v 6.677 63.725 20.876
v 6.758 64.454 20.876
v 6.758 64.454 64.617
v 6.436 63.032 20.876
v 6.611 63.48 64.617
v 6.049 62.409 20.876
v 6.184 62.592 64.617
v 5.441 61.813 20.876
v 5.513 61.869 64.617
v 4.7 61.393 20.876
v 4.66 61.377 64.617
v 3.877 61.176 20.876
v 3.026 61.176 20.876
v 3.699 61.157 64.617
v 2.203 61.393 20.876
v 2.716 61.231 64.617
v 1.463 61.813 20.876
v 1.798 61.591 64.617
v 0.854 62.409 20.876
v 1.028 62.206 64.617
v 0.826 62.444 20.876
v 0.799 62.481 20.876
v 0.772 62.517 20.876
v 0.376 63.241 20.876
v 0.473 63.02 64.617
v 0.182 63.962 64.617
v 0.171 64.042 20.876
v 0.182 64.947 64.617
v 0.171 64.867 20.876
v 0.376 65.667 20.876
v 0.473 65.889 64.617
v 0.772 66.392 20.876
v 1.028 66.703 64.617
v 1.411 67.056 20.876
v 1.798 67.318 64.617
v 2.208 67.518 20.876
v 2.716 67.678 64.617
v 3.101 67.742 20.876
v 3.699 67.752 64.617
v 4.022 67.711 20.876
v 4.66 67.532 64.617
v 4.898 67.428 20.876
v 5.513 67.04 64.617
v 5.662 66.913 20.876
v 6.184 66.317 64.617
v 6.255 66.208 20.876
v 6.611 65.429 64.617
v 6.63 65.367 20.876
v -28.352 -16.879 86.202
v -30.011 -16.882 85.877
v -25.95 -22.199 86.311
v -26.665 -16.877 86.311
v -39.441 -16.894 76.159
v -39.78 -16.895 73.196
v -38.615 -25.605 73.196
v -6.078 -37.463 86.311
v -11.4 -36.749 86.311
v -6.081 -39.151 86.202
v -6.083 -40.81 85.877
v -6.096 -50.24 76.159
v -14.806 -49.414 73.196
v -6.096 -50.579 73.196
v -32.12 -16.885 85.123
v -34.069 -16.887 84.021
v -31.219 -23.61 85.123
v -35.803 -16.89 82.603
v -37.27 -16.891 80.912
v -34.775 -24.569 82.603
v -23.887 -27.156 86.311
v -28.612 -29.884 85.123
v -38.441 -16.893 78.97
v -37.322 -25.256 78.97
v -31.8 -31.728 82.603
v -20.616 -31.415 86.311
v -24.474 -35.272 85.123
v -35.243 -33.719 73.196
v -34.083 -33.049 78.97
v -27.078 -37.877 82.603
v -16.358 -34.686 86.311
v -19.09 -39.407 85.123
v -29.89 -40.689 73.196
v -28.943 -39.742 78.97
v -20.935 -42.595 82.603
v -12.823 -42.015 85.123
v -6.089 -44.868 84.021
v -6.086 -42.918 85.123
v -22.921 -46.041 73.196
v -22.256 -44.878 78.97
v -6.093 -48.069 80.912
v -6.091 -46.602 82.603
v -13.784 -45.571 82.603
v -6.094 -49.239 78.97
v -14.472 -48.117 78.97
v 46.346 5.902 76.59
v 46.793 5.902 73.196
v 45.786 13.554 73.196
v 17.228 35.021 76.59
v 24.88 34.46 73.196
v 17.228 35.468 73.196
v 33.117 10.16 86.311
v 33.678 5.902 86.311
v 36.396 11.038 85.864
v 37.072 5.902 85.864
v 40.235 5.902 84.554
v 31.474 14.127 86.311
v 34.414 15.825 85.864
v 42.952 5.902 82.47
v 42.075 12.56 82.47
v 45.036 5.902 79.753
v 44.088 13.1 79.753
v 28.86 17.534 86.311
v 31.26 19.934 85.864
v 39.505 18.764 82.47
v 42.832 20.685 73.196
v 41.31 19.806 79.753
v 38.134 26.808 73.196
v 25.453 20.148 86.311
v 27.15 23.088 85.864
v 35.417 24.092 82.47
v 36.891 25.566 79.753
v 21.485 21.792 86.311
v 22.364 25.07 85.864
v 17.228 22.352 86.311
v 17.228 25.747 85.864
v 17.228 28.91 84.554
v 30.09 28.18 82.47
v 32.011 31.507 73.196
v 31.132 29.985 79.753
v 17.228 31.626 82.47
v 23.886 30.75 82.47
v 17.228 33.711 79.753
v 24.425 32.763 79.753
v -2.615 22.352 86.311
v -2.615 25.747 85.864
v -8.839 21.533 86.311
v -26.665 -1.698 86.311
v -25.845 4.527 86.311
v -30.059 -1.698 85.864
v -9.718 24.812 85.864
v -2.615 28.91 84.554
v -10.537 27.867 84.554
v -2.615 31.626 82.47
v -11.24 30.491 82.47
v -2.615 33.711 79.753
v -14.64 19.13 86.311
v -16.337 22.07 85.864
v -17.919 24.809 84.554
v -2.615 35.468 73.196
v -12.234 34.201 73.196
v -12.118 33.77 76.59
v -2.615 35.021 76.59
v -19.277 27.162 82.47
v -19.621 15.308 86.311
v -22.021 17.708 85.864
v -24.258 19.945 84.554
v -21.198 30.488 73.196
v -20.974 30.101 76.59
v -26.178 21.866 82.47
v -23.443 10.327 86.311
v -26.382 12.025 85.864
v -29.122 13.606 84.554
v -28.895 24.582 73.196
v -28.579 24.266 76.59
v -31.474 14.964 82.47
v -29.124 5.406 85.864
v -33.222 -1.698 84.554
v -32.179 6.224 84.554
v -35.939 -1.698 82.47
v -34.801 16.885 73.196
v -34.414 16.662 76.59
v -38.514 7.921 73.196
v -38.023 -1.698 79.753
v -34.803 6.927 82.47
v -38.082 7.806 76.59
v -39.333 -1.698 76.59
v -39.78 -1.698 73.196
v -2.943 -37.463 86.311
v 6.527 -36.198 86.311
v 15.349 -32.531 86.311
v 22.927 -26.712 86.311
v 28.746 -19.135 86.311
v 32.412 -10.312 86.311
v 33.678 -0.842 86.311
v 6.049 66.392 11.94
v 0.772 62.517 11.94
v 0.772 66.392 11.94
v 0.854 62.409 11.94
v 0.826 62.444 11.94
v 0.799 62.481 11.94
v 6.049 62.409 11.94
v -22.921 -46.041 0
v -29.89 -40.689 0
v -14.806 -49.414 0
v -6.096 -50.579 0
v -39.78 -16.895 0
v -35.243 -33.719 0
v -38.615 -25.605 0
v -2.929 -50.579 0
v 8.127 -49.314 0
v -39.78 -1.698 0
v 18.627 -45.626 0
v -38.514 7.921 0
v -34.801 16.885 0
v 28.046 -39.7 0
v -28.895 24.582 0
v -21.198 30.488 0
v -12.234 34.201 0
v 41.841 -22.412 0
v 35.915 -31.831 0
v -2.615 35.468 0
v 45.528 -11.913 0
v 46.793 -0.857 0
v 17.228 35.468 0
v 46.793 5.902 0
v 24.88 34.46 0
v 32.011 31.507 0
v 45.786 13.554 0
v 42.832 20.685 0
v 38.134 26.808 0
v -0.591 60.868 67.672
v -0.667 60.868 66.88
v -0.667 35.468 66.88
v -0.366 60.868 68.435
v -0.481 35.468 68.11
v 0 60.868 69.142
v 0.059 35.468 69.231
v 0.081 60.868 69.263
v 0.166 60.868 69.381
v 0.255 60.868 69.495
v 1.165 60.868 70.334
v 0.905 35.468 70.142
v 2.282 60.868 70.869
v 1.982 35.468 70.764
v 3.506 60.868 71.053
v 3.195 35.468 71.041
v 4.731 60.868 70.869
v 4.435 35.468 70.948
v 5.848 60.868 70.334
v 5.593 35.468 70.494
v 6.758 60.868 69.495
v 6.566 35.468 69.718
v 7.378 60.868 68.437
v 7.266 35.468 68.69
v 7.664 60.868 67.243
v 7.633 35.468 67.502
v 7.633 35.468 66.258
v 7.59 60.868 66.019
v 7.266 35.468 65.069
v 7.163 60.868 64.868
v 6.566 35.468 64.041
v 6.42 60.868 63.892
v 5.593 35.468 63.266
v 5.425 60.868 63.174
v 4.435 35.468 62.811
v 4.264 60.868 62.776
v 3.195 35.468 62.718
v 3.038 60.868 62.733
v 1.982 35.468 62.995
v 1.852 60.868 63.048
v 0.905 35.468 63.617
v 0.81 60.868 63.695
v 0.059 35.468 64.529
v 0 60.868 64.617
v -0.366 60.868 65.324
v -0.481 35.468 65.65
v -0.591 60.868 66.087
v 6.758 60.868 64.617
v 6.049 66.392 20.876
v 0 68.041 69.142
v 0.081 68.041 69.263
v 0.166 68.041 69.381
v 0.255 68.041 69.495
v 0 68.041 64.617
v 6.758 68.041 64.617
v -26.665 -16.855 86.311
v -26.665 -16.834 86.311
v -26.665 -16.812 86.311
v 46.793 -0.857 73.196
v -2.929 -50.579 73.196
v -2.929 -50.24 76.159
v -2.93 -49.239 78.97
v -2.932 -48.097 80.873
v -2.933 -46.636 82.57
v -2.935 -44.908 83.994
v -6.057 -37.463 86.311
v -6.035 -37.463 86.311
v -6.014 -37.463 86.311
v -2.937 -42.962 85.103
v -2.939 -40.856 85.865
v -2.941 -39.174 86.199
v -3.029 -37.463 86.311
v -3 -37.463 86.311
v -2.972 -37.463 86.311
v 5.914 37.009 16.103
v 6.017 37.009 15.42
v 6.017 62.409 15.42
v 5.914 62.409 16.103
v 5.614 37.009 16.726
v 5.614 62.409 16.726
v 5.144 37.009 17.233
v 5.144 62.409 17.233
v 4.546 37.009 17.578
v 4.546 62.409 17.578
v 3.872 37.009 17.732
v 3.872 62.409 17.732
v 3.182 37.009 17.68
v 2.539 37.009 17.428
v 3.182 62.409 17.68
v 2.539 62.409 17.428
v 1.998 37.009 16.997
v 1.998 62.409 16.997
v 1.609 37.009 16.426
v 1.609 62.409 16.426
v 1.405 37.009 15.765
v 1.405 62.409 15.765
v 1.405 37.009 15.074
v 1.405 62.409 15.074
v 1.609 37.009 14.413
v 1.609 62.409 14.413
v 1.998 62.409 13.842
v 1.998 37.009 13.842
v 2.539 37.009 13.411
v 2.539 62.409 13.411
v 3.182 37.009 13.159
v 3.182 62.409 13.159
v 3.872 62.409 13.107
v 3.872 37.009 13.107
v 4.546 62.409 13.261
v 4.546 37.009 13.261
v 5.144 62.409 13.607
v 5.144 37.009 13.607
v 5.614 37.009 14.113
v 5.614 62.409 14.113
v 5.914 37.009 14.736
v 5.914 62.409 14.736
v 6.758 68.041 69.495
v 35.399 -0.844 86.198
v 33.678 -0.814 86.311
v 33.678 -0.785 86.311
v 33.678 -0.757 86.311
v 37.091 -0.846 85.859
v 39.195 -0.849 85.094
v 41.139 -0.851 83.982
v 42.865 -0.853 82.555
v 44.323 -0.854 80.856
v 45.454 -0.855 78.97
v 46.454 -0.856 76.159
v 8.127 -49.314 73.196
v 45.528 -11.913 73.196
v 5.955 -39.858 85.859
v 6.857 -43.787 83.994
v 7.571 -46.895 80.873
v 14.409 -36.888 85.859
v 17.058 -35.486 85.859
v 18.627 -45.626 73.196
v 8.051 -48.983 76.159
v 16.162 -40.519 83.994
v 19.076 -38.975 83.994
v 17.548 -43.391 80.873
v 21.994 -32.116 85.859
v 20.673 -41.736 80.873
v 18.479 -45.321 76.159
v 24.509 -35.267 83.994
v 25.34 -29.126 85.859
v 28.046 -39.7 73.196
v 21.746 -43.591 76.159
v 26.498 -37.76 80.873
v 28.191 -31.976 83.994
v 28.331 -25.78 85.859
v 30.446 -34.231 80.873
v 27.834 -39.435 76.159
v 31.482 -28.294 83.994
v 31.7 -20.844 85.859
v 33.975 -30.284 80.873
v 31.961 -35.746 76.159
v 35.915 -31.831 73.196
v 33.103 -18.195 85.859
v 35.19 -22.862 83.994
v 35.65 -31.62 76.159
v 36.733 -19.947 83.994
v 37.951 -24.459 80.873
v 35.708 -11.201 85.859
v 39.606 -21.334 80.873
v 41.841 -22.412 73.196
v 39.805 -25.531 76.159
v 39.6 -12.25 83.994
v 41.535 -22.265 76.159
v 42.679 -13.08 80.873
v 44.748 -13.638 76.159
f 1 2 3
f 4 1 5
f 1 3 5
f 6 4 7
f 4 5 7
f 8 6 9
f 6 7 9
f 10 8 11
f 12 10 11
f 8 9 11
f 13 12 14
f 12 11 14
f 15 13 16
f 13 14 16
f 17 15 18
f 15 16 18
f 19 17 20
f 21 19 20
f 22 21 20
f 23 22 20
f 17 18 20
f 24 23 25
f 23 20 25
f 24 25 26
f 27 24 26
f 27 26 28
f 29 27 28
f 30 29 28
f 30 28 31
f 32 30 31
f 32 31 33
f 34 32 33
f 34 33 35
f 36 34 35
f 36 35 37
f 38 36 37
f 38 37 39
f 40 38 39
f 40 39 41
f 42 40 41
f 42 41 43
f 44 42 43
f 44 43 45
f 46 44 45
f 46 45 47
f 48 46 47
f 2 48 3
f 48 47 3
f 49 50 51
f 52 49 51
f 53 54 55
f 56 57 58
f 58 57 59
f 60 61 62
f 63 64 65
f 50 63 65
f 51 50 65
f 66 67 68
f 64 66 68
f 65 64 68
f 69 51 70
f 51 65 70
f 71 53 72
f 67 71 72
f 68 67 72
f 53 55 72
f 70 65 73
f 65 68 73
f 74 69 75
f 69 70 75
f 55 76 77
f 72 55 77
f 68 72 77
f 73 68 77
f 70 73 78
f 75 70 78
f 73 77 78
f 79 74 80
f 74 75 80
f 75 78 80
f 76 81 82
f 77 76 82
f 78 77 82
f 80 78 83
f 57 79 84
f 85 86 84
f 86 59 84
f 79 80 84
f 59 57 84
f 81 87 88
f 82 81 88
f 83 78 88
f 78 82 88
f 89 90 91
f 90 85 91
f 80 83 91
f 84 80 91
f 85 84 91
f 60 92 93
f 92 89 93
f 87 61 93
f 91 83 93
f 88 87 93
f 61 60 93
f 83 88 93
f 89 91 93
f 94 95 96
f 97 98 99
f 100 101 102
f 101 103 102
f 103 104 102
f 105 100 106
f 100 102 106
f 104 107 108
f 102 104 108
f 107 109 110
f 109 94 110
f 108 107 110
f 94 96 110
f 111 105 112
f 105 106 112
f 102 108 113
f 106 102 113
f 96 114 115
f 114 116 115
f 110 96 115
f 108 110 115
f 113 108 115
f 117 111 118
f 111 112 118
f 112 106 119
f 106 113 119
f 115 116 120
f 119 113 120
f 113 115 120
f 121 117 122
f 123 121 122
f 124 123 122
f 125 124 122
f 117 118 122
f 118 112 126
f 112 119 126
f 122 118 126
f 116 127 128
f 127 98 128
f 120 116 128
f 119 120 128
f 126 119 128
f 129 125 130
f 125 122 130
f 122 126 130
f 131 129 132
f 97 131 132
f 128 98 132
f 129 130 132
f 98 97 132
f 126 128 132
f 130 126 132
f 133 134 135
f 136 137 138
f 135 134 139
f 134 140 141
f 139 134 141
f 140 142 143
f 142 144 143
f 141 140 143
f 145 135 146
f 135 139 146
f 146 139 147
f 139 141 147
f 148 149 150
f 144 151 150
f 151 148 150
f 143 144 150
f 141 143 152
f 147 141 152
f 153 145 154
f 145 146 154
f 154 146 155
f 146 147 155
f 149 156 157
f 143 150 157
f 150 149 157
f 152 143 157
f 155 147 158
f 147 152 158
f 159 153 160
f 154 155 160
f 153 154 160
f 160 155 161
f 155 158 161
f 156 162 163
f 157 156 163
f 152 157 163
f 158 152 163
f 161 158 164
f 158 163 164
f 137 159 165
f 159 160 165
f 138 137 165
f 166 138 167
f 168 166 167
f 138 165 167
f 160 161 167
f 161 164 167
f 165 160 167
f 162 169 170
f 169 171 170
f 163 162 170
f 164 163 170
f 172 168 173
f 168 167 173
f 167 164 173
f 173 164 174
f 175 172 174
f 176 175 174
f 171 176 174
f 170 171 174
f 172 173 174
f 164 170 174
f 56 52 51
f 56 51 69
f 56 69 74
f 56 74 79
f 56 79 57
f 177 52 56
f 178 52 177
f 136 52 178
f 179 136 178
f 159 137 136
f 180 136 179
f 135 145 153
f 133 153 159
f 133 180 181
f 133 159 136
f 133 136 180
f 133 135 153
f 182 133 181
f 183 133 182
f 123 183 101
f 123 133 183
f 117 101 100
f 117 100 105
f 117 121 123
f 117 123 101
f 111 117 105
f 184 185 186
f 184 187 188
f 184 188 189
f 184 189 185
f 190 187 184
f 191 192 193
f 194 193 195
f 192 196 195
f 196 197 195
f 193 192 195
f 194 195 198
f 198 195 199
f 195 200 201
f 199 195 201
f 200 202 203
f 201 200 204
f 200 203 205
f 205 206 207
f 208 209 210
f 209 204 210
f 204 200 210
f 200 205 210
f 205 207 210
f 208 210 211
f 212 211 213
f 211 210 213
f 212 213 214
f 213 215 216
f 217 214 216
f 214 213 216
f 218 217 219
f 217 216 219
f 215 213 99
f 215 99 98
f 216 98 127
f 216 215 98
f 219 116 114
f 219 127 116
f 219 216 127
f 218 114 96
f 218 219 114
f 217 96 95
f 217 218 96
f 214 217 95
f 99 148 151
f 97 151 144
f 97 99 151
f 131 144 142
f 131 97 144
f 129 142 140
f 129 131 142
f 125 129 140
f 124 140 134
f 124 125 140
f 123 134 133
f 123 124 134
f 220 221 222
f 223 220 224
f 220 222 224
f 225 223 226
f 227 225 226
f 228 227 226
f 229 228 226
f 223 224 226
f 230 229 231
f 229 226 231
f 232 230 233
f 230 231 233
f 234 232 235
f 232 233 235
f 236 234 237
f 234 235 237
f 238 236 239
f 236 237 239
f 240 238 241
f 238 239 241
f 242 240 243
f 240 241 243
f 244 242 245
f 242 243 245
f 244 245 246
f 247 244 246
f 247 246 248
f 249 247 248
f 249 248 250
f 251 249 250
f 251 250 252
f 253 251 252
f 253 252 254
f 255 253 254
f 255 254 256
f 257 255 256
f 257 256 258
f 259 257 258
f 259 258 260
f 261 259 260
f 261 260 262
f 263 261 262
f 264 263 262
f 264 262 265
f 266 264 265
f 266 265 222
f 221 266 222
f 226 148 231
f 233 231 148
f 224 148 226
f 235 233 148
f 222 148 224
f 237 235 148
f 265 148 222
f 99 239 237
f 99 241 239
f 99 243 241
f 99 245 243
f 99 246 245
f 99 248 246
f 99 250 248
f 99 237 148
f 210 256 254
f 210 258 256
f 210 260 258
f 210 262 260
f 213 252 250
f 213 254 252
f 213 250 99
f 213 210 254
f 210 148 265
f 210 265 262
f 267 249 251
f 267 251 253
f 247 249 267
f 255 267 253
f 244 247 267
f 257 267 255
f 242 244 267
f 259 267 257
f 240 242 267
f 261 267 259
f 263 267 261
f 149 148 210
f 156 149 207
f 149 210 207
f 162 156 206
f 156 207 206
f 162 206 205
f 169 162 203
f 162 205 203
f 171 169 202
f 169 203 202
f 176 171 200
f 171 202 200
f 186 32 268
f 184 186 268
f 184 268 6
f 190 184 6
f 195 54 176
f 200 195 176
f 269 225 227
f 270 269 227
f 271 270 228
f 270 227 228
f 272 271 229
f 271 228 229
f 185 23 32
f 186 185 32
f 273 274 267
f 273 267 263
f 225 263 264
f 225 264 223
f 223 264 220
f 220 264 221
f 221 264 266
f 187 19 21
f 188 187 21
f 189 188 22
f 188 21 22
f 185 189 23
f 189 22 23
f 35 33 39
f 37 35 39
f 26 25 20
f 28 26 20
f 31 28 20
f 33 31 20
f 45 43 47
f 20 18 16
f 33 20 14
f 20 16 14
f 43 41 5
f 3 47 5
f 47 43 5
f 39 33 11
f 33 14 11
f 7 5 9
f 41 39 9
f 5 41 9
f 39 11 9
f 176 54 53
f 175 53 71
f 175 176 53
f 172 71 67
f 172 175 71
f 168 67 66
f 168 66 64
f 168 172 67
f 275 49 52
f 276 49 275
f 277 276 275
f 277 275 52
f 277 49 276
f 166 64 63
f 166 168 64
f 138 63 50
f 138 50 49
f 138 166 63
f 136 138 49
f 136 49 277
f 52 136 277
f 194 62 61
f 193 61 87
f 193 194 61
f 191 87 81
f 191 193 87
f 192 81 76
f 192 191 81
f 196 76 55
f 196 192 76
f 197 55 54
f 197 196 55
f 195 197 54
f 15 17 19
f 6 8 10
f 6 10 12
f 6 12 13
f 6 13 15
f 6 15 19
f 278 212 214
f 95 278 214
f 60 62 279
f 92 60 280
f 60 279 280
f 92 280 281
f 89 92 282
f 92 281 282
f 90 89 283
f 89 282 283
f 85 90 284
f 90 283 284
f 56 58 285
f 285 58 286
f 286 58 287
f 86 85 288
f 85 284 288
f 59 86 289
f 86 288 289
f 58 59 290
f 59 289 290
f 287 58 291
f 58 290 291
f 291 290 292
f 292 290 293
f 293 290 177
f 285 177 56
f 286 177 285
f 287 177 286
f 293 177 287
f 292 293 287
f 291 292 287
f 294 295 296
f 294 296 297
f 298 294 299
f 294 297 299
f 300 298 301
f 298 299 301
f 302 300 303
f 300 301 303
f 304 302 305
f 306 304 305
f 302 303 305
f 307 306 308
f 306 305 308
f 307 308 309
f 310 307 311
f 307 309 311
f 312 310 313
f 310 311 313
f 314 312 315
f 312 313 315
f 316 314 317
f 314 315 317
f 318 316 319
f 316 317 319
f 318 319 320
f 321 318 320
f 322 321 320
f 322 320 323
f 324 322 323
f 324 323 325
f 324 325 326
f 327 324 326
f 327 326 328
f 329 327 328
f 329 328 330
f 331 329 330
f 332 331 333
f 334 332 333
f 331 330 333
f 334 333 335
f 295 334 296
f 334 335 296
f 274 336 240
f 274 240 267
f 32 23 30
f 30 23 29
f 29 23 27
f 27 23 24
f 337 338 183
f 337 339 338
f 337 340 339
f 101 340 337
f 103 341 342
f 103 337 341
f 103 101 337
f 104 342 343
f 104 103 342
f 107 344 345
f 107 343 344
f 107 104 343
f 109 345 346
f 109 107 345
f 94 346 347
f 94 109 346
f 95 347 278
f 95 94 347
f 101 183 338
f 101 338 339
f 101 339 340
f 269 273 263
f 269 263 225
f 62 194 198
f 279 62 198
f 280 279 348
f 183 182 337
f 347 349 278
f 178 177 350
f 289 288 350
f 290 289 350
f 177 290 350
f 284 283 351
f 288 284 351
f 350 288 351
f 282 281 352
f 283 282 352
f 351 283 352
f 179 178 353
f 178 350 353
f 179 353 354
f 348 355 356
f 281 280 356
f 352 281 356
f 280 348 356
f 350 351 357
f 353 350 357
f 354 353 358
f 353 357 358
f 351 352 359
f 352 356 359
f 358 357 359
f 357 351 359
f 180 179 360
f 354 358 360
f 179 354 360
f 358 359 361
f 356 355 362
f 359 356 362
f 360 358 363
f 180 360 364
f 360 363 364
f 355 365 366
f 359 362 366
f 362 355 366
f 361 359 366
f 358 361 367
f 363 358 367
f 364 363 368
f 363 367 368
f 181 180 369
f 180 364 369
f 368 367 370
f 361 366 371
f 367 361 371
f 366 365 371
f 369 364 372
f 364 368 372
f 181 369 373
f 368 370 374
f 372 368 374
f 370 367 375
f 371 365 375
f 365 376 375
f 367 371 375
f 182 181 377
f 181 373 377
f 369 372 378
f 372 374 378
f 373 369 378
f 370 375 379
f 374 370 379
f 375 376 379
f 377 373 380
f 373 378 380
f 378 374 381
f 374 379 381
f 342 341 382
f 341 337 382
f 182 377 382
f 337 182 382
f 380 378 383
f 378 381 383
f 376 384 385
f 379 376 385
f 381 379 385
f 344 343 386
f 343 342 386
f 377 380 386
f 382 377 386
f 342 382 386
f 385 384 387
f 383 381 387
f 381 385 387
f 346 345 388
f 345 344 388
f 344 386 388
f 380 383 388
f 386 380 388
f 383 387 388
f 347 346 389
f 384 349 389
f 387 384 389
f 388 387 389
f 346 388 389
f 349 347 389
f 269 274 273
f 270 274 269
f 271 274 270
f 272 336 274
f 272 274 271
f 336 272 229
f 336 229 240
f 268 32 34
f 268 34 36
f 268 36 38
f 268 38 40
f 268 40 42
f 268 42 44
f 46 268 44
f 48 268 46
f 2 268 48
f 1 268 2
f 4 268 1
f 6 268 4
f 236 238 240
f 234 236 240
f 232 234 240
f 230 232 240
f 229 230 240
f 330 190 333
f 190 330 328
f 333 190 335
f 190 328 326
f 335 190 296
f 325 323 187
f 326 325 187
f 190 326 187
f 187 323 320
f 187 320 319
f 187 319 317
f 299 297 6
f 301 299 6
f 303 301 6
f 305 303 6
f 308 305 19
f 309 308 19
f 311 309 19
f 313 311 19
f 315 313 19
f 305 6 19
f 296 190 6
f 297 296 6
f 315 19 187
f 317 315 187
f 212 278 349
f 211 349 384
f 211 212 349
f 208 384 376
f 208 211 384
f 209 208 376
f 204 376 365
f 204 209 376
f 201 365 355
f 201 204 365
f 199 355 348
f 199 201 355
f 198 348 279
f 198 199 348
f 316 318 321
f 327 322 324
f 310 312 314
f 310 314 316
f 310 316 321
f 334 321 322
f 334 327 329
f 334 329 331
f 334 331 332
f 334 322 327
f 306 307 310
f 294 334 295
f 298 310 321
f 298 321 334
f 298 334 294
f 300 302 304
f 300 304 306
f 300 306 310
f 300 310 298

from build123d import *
from build123d import SkipClean  # not in build123d's __all__

# Parameters (mm, degrees)
F0_W         = 86.5733101964
F0_H         = 86.0464125872
F1_DEPTH     = 86.3111019135
F2_R         = 4.1730965083
F3_DEPTH     = 25.4
F5_DEPTH     = 7.1736387908
F6_R         = 3.3064136906
F7_DEPTH     = 43.7414944172
F9_DEPTH     = 8.9356992394
F10_R        = 2.3189722618
F11_DEPTH    = 25.4
F12_R        = 13.1155446623
F13_T1_DEPTH = 160.2242547154
F13_T4_ANGLE = 90
F14_T1_DEPTH = 179.2241870522
F14_T4_ANGLE = 90
F15_T1_DEPTH = 210.8662437018
F15_T4_ANGLE = 90
F16_T1_DEPTH = 170.7269310844
F16_T4_ANGLE = 90


# Not quite as in the source:
# - a fillet or chamfer that OpenCascade refuses, or shapes differently, is made with other operations: its cross-section is extruded or revolved along the edge and cut away or added


with BuildPart() as f1:
    # F0 (on Top) → F1 (new body)
    with BuildSketch(Plane.XY):
        with Locations((3.5064853728, -7.5555443764)):
            Rectangle(F0_W, F0_H)
    extrude(amount=F1_DEPTH)

    # F2 (on face) → F3 (join)
    with BuildSketch(Plane(origin=(0, 35.4676619172, 0), x_dir=(-1, 0, 0), z_dir=(0, 1, 0))):
        with Locations((-3.5064853728, 66.8797194958)):
            Circle(F2_R)
    extrude(amount=F3_DEPTH)

    # F4 (on face) → F5 (join)
    with BuildSketch(Plane(origin=(0, 60.8676619172, 0), x_dir=(-1, 0, 0), z_dir=(0, 1, 0))):
        with BuildLine():
            Line((-0.2548632519, 69.4953815632), (-6.7581074936, 69.4953815632))
            Line((-6.7581074936, 69.4953815632), (-6.7581074936, 64.6171336304))
            Line((-6.7581074936, 64.6171336304), (0, 64.6171336304))
            Line((0, 64.6171336304), (0, 69.1423053611))
            ThreePointArc((0, 69.1423053611), (-0.1228231667, 69.3221700158), (-0.2548632519, 69.4953815632))
        make_face()
    extrude(amount=F5_DEPTH)

    # F12
    f12_edges = [f1.edges().sort_by_distance(p)[0] for p in [
        (3.506485, 35.467662, 86.311102),
        (-39.78017, -7.555544, 86.311102),
        (3.506485, -50.578751, 86.311102),
        (46.79314, -7.555544, 86.311102),
    ]]
    fillet(f12_edges, radius=F12_R)

    # F13: fillet of radius 29.5652611208 on 1 edges, made by hand

    # F13_s2 → F13_t1 (cut)
    with BuildSketch(Plane.XY.offset(-73.9131528019)):
        with BuildLine():
            ThreePointArc((17.2278793502, 35.4676619172), (38.1336759763, 26.8081974225), (46.793140471, 5.9024007964))
            Line((46.793140471, 5.9024007964), (46.793140471, 35.4676619172))
            Line((46.793140471, 35.4676619172), (17.2278793502, 35.4676619172))
        make_face()
    extrude(amount=F13_T1_DEPTH, mode=Mode.SUBTRACT)

    # F13_s3 → F13_t4 (revolve, cut)
    with BuildSketch(Plane.XZ.offset(-5.9024007964)):
        with BuildLine():
            ThreePointArc((33.6775958086, 86.3111019135), (42.9516863783, 82.4696478208), (46.793140471, 73.1955572511))
            Line((46.793140471, 73.1955572511), (46.793140471, 86.3111019135))
            Line((46.793140471, 86.3111019135), (33.6775958086, 86.3111019135))
        make_face()
    revolve(axis=Axis((17.2278793502, 5.9024007964, 86.3111019135), (0, 0, 1)), revolution_arc=F13_T4_ANGLE, mode=Mode.SUBTRACT)

    # F14: fillet of radius 37.1652340555 on 1 edges, made by hand

    # F14_s2 → F14_t1 (cut)
    with BuildSketch(Plane.XY.offset(-92.9130851387)):
        with BuildLine():
            ThreePointArc((-2.6149356699, 35.4676619172), (-28.8947246949, 24.5822168867), (-39.7801697254, -1.6975721383))
            Line((-39.7801697254, -1.6975721383), (-39.7801697254, 35.4676619172))
            Line((-39.7801697254, 35.4676619172), (-2.6149356699, 35.4676619172))
        make_face()
    extrude(amount=F14_T1_DEPTH, mode=Mode.SUBTRACT)

    # F14_s3 → F14_t4 (revolve, cut)
    with BuildSketch(Plane.YZ.offset(-2.6149356699)):
        with BuildLine():
            ThreePointArc((22.3521172549, 86.3111019135), (31.6262078246, 82.4696478208), (35.4676619172, 73.1955572511))
            Line((35.4676619172, 73.1955572511), (35.4676619172, 86.3111019135))
            Line((35.4676619172, 86.3111019135), (22.3521172549, 86.3111019135))
        make_face()
    with SkipClean():  # cleaning this boolean's faces spoils the solid; the shape is the same uncleaned
        revolve(axis=Axis((-2.6149356699, -1.6975721383, 86.3111019135), (0, 0, 1)), revolution_arc=F14_T4_ANGLE, mode=Mode.SUBTRACT)

    # F15: fillet of radius 49.8221567152 on 1 edges, made by hand

    # F15_s2 → F15_t1 (cut)
    with BuildSketch(Plane.XY.offset(-124.5551417884)):
        with BuildLine():
            ThreePointArc((46.793240471, -0.7566939547), (32.2006686224, -35.9862788214), (-3.0289162443, -50.57885067))
            Line((-3.0289162443, -50.57885067), (-3.0289162443, -51.5752938043))
            ThreePointArc((-3.0289162443, -51.5752938043), (21.8821121134, -51.5751938043), (46.793140471, -51.5751938043))
            Line((46.793140471, -51.5751938043), (47.7895836053, -50.57875067))
            ThreePointArc((47.7895836053, -50.57875067), (47.7895836053, -25.6677223123), (47.7896836053, -0.7566939547))
            Line((47.7896836053, -0.7566939547), (46.793240471, -0.7566939547))
        make_face()
    extrude(amount=F15_T1_DEPTH, mode=Mode.SUBTRACT)

    # F15_s3 → F15_t4 (revolve, cut)
    with BuildSketch(Plane.YZ.offset(-3.0289162443)):
        with BuildLine():
            ThreePointArc((-37.4633060076, 86.3111019135), (-46.7373965773, 82.4696478208), (-50.57885067, 73.1955572511))
            Line((-50.57885067, 73.1955572511), (-50.57885067, 86.3111019135))
            Line((-50.57885067, 86.3111019135), (-37.4633060076, 86.3111019135))
        make_face()
    revolve(axis=Axis((-3.0289162443, -0.7566939547, 86.3111019135), (0, 0, 1)), revolution_arc=F15_T4_ANGLE, mode=Mode.SUBTRACT)

    # F16: fillet of radius 33.7664316682 on 1 edges, made by hand

    # F16_s2 → F16_t1 (cut)
    with BuildSketch(Plane.XY.offset(-84.415829171)):
        with BuildLine():
            ThreePointArc((-6.0138380572, -50.57885067), (-29.8903108663, -40.6888918108), (-39.7802697254, -16.8124190017))
            Line((-39.7802697254, -16.8124190017), (-40.4555983588, -16.8124190017))
            ThreePointArc((-40.4555983588, -16.8124190017), (-40.4554983588, -33.6955848358), (-40.4554983588, -50.57875067))
            Line((-40.4554983588, -50.57875067), (-39.7801697254, -51.2540793033))
            ThreePointArc((-39.7801697254, -51.2540793033), (-22.8970038913, -51.2540793033), (-6.0138380572, -51.2541793033))
            Line((-6.0138380572, -51.2541793033), (-6.0138380572, -50.57885067))
        make_face()
    extrude(amount=F16_T1_DEPTH, mode=Mode.SUBTRACT)

    # F16_s3 → F16_t4 (revolve, cut)
    with BuildSketch(Plane.XZ.offset(16.8124190017)):
        with BuildLine():
            ThreePointArc((-26.6647250631, 86.3111019135), (-35.9388156328, 82.4696478208), (-39.7802697254, 73.1955572511))
            Line((-39.7802697254, 73.1955572511), (-39.7802697254, 86.3111019135))
            Line((-39.7802697254, 86.3111019135), (-26.6647250631, 86.3111019135))
        make_face()
    revolve(axis=Axis((-6.0138380572, -16.8124190017, 86.3111019135), (0, 0, 1)), revolution_arc=F16_T4_ANGLE, mode=Mode.SUBTRACT)


with BuildPart() as f7:
    # F6 (on face) → F7 (new body)
    with BuildSketch(Plane(origin=(0, 0, 64.6171336304), x_dir=(1, 0, 0), z_dir=(0, 0, -1))):
        with Locations((3.4516938031, -64.4544813126)):
            Circle(F6_R)
    extrude(amount=F7_DEPTH)

    # F8 (on face) → F9 (join)
    with BuildSketch(Plane(origin=(0, 0, 20.8756392132), x_dir=(1, 0, 0), z_dir=(0, 0, -1))):
        with BuildLine():
            Line((0.7723765187, -62.5170525055), (0.7723765187, -66.3919101197))
            Line((0.7723765187, -66.3919101197), (6.0492576756, -66.3919101197))
            Line((6.0492576756, -66.3919101197), (6.0492576756, -62.4087458896))
            Line((6.0492576756, -62.4087458896), (0.8541299305, -62.4087458896))
            ThreePointArc((0.8541299305, -62.4087458896), (0.8126975418, -62.4624797498), (0.7723765187, -62.5170525055))
        make_face()
    extrude(amount=F9_DEPTH)

    # F10 (on face) → F11 (join)
    with BuildSketch(Plane.XZ.offset(-62.4087458896)):
        with Locations((3.6983042955, 15.4196098447)):
            Circle(F10_R)
    extrude(amount=F11_DEPTH)


solid = Compound([f1.part, f7.part])
